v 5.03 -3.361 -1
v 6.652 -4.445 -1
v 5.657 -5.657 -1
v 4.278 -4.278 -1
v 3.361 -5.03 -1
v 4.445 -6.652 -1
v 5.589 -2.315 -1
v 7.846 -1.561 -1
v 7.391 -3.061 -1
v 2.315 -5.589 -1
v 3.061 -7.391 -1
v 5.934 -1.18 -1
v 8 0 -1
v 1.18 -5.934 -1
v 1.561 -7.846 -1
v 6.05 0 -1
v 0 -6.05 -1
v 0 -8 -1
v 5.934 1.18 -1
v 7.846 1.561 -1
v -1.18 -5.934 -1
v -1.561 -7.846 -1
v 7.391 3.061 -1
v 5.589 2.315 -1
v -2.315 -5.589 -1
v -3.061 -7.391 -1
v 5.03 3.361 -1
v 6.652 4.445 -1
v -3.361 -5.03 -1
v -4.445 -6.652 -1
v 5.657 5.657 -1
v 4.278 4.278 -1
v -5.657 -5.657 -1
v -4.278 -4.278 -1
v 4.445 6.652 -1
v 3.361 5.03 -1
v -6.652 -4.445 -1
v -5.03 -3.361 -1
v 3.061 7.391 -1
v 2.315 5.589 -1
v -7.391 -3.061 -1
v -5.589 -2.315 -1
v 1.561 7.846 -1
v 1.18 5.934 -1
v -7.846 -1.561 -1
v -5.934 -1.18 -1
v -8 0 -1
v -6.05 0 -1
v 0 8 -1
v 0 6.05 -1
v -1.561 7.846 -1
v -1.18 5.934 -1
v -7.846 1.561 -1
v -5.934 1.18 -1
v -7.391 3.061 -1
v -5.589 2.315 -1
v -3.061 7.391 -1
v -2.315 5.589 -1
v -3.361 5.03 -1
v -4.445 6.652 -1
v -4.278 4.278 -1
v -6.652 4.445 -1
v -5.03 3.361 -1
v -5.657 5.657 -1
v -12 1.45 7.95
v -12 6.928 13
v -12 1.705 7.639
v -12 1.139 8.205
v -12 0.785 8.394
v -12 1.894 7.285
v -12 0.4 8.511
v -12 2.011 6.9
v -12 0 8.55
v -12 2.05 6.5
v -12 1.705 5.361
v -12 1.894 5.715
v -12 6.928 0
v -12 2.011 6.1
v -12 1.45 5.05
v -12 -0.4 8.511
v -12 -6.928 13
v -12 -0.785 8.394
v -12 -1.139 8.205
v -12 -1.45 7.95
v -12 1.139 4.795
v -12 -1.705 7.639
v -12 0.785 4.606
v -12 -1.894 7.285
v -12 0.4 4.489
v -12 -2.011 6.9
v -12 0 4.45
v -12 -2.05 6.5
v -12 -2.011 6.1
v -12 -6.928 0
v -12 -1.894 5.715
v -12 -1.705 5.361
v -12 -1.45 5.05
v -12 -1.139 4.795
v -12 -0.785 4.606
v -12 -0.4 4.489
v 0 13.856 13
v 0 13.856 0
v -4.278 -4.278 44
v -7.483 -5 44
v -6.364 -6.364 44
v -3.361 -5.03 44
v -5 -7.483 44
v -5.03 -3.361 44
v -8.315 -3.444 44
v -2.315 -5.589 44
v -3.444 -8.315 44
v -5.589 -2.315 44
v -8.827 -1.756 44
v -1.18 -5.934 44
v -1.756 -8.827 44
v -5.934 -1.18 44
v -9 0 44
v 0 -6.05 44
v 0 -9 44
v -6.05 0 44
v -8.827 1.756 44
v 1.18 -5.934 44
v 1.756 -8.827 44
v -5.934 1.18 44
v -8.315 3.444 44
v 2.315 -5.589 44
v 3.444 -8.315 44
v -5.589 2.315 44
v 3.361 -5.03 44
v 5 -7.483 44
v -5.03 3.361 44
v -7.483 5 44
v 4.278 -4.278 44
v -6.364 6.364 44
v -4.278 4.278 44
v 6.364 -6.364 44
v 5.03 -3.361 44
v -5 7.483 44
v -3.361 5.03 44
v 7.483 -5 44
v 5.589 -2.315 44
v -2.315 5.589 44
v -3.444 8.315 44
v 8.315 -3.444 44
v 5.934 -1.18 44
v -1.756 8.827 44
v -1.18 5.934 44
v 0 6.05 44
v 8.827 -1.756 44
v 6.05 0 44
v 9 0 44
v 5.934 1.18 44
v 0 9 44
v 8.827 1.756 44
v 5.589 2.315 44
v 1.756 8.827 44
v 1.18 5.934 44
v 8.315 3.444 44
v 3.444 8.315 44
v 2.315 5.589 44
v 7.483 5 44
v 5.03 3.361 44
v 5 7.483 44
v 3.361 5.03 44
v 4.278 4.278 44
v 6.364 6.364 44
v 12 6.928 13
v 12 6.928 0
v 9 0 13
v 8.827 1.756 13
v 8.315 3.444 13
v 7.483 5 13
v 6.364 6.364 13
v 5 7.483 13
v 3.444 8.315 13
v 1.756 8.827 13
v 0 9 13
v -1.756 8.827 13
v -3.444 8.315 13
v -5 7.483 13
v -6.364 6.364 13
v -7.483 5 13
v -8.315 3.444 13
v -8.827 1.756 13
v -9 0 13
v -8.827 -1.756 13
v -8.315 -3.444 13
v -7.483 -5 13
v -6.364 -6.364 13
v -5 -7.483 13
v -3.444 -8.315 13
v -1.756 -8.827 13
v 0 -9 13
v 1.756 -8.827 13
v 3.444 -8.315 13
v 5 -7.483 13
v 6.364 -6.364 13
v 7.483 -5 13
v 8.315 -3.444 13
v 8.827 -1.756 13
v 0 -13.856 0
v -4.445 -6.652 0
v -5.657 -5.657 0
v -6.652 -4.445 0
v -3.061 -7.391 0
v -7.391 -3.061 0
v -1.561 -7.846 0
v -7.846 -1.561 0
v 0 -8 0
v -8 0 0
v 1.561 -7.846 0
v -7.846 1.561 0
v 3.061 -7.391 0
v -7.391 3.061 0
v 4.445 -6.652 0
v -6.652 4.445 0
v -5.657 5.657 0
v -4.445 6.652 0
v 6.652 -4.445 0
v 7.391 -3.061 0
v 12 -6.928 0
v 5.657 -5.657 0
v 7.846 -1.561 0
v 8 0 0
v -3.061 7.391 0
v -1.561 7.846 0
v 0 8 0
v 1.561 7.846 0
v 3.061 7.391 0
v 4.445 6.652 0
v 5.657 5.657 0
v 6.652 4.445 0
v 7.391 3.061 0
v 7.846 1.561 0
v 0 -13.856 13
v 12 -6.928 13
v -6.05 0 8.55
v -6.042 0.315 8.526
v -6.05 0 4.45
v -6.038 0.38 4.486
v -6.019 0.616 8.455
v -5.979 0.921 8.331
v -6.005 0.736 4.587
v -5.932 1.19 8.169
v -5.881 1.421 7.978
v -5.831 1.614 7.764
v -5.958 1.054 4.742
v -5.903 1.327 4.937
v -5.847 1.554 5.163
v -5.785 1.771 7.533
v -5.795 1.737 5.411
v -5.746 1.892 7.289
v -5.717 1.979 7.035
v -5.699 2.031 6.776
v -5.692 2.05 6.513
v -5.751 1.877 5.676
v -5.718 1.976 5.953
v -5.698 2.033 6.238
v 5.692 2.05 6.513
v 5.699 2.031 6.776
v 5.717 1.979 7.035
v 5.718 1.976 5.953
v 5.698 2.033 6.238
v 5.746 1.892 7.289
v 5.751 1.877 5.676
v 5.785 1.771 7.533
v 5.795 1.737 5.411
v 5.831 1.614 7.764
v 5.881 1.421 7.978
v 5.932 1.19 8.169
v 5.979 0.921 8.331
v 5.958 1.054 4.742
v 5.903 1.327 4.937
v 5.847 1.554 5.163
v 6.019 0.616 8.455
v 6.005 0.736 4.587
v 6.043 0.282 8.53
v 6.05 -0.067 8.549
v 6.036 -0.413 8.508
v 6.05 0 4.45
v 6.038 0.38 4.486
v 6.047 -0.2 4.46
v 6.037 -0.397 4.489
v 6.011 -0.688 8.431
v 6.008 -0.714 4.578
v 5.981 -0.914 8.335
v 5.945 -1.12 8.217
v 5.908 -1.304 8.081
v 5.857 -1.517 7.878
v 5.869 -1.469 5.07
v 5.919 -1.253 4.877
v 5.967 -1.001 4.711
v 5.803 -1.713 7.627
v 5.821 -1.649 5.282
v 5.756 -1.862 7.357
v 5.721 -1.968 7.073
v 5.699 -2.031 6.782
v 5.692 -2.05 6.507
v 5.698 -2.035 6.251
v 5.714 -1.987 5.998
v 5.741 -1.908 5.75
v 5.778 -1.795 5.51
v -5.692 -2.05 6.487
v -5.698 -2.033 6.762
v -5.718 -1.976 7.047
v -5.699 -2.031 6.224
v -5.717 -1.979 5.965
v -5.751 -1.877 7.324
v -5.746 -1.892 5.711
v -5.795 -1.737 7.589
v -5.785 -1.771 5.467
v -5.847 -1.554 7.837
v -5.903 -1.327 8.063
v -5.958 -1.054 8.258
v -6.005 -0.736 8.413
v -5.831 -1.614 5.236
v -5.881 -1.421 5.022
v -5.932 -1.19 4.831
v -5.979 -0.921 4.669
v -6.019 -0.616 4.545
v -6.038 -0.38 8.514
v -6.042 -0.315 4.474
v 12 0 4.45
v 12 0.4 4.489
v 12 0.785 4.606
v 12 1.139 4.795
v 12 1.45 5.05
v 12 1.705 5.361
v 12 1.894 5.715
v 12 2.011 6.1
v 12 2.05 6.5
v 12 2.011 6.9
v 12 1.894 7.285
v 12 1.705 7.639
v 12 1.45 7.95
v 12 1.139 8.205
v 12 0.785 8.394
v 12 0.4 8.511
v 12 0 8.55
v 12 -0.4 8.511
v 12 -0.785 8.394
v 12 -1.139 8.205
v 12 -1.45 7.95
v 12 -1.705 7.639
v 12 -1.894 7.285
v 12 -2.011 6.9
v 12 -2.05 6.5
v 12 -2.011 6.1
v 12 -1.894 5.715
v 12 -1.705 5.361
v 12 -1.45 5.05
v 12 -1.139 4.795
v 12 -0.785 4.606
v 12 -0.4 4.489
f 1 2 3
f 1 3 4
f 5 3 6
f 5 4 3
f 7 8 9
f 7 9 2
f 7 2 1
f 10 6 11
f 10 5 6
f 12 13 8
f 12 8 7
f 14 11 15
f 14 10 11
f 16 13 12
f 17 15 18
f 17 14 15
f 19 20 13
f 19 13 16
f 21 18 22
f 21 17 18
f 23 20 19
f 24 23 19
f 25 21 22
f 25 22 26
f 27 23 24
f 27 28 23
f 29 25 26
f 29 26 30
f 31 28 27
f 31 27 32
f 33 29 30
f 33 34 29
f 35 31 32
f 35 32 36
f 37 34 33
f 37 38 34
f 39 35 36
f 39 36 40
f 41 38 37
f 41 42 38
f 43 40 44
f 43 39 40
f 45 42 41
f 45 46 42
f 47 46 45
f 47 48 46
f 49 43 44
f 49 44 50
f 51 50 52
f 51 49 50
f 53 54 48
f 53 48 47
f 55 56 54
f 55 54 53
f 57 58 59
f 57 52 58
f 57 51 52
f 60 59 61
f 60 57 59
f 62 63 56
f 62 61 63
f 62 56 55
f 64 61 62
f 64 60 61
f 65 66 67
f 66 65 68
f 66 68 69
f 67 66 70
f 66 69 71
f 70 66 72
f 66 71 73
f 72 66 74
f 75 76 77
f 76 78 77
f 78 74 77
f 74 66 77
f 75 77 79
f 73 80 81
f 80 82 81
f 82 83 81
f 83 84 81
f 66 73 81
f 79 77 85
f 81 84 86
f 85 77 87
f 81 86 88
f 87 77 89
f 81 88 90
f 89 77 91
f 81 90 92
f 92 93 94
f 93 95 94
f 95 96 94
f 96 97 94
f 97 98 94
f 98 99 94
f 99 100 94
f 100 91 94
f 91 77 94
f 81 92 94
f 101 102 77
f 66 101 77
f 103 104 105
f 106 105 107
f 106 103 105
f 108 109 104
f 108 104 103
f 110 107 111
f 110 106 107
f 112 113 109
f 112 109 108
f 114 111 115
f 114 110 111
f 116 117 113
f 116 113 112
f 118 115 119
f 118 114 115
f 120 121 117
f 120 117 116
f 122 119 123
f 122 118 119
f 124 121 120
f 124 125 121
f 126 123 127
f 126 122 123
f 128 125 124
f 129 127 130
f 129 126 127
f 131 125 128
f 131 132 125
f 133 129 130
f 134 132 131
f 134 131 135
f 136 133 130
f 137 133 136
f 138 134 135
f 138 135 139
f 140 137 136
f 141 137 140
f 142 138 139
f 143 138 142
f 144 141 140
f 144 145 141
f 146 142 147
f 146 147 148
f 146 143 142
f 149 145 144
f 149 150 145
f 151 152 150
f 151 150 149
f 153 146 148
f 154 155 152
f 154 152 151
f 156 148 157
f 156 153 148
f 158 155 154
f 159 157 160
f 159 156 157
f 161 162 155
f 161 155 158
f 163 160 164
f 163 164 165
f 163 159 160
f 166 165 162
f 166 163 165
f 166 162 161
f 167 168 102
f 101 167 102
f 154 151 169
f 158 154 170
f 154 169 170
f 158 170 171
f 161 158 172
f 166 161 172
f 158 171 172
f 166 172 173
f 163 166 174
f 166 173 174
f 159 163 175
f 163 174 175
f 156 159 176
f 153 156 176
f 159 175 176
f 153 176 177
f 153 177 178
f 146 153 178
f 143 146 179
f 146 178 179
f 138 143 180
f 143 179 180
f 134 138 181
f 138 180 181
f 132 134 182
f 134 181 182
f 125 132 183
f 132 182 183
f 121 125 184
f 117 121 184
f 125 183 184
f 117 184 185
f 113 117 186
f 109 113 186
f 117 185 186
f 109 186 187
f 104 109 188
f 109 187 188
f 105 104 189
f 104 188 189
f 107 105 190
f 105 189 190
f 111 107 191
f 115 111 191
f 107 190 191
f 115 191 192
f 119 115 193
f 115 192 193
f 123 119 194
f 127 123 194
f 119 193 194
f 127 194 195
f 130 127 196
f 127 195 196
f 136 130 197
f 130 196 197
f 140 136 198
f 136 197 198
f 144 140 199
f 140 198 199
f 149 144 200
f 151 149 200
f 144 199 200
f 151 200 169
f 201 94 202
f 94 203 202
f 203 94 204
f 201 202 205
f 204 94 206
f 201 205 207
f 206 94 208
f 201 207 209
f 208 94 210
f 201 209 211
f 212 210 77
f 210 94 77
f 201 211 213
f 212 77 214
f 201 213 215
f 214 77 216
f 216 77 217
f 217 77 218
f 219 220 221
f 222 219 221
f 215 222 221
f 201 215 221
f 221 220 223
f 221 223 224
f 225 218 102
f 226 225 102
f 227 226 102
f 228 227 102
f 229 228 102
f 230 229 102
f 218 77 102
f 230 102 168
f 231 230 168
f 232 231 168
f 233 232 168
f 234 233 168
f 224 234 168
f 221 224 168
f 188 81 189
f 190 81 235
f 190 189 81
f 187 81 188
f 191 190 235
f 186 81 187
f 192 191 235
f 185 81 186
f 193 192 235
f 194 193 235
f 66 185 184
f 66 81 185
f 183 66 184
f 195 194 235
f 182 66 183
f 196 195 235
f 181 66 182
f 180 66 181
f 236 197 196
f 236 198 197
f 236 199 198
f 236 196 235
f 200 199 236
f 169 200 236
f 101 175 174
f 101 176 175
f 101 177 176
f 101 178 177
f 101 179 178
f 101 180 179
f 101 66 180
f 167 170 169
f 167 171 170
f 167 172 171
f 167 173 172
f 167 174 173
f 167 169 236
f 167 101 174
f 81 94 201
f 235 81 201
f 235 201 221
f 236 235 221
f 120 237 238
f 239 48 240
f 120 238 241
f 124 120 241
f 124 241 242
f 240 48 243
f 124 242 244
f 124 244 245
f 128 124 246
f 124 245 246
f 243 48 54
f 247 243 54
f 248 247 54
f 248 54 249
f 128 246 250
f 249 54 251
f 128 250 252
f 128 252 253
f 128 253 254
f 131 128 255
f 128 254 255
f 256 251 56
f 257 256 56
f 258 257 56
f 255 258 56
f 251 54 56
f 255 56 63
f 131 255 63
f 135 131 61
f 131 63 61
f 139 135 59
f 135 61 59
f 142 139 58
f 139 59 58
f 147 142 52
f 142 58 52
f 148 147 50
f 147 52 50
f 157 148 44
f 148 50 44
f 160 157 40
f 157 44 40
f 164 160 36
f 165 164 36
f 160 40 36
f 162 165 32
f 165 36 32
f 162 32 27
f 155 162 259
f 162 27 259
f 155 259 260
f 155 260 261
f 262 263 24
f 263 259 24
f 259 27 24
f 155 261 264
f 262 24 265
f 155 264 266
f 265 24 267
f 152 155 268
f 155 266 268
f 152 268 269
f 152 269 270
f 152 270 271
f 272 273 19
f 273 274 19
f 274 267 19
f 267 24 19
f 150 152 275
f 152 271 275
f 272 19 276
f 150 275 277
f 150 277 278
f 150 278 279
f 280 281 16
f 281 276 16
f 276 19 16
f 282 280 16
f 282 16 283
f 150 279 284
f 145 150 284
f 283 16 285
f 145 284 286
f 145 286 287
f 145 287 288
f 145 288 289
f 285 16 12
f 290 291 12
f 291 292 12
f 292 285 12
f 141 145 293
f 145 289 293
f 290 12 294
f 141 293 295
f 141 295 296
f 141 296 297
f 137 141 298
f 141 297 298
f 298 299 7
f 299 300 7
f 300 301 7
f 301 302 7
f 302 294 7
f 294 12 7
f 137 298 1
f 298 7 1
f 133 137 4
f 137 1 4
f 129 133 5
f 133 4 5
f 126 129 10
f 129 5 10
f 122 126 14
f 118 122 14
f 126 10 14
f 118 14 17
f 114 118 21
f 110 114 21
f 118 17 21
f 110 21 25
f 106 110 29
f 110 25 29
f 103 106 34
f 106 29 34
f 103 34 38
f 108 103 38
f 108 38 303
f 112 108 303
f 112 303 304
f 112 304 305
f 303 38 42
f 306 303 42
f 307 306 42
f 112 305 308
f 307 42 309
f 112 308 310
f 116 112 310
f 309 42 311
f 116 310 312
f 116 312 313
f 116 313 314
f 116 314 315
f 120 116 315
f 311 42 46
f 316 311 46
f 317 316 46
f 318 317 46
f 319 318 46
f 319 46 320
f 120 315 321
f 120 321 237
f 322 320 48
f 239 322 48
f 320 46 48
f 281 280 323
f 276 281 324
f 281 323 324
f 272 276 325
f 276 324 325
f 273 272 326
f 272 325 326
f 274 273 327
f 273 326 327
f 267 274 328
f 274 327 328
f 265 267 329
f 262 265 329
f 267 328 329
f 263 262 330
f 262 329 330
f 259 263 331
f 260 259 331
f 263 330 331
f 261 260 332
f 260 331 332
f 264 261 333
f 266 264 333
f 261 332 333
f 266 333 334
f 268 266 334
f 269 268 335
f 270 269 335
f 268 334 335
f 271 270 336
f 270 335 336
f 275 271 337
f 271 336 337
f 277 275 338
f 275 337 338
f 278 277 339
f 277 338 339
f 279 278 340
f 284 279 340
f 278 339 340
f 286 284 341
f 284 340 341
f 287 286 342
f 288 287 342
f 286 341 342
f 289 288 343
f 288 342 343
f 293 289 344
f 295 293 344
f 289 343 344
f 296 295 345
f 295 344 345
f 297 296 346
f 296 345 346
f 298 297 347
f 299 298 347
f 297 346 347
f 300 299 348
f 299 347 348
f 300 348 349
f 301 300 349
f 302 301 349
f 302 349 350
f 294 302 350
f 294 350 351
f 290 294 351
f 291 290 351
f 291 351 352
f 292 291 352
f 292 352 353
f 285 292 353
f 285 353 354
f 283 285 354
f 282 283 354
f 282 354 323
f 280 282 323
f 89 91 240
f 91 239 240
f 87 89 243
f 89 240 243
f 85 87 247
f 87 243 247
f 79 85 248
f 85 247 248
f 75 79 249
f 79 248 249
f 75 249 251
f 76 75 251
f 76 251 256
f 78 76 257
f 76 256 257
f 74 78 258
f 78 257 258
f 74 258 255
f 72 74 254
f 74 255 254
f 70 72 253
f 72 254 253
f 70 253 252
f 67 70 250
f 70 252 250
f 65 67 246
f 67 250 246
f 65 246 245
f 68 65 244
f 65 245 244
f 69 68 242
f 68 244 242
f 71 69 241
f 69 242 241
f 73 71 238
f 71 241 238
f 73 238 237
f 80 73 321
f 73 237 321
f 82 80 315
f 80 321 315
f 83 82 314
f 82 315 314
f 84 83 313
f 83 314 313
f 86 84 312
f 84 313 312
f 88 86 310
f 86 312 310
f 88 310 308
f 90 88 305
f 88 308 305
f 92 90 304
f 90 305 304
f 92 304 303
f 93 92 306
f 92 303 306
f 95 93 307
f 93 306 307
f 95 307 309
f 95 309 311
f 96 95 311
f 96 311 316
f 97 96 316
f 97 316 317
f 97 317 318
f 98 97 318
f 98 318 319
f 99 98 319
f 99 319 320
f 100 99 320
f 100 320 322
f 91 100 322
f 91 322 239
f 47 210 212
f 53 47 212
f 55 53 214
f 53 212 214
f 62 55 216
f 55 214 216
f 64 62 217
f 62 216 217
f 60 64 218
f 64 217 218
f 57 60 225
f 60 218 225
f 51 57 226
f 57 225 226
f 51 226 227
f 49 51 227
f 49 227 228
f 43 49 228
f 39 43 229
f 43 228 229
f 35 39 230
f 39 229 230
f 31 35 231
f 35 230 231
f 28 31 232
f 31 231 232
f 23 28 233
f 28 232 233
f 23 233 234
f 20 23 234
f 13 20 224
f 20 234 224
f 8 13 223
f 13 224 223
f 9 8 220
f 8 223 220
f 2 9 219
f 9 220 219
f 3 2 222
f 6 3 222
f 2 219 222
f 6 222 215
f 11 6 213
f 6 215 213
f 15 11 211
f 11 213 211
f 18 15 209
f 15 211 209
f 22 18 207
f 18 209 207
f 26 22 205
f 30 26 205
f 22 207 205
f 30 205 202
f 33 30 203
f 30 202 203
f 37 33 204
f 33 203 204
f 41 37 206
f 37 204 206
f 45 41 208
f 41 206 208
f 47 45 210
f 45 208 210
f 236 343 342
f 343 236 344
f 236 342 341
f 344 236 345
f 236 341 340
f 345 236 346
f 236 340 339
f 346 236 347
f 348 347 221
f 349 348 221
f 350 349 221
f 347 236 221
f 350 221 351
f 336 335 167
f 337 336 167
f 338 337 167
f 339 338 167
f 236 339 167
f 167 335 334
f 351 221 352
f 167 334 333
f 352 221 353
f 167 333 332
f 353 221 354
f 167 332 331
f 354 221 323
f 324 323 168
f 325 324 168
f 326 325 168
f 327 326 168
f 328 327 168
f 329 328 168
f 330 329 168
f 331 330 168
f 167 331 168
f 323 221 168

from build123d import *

# Parameters (mm, degrees)
EXTRUDE_1_DEPTH     = 13
SKETCH_2_R          = 9
EXTRUDE_2_DEPTH     = 31
SKETCH_3_R          = 8
EXTRUDE_3_DEPTH     = 1
SKETCH_4_R          = 6.05
CUT_EXTRUDE_1_DEPTH = 45
SKETCH_5_R          = 2.05
CUT_EXTRUDE_2_DEPTH = 25


with BuildPart() as part:
    # 草图1 → 凸台-拉伸1 (new body)
    with BuildSketch(Plane.XY):
        Polygon((0, 13.856406461), (-12, 6.92820323), (-12, -6.92820323), (0, -13.856406461), (12, -6.92820323), (12, 6.92820323), align=None)
    extrude(amount=EXTRUDE_1_DEPTH)

    # 草图2 → 凸台-拉伸2 (add)
    with BuildSketch(Plane.XY.offset(13)):
        Circle(SKETCH_2_R)
    extrude(amount=EXTRUDE_2_DEPTH)

    # 草图3 → 凸台-拉伸3 (add)
    with BuildSketch(Plane(origin=(0, 0, 0), x_dir=(-1, 0, 0), z_dir=(0, 0, -1))):
        Circle(SKETCH_3_R)
    extrude(amount=EXTRUDE_3_DEPTH)

    # 草图4 → 切除-拉伸1 (cut)
    with BuildSketch(Plane(origin=(0, 0, -1), x_dir=(-1, 0, 0), z_dir=(0, 0, -1))):
        Circle(SKETCH_4_R)
    extrude(amount=-CUT_EXTRUDE_1_DEPTH, mode=Mode.SUBTRACT)

    # 草图5 → 切除-拉伸2 (cut, symmetric)
    with BuildSketch(Plane(origin=(0, 0, 0), x_dir=(0, 0, -1), z_dir=(1, 0, 0))):
        with Locations((-6.5, 0)):
            Circle(SKETCH_5_R)
    extrude(amount=CUT_EXTRUDE_2_DEPTH, both=True, mode=Mode.SUBTRACT)


solid = part.part
